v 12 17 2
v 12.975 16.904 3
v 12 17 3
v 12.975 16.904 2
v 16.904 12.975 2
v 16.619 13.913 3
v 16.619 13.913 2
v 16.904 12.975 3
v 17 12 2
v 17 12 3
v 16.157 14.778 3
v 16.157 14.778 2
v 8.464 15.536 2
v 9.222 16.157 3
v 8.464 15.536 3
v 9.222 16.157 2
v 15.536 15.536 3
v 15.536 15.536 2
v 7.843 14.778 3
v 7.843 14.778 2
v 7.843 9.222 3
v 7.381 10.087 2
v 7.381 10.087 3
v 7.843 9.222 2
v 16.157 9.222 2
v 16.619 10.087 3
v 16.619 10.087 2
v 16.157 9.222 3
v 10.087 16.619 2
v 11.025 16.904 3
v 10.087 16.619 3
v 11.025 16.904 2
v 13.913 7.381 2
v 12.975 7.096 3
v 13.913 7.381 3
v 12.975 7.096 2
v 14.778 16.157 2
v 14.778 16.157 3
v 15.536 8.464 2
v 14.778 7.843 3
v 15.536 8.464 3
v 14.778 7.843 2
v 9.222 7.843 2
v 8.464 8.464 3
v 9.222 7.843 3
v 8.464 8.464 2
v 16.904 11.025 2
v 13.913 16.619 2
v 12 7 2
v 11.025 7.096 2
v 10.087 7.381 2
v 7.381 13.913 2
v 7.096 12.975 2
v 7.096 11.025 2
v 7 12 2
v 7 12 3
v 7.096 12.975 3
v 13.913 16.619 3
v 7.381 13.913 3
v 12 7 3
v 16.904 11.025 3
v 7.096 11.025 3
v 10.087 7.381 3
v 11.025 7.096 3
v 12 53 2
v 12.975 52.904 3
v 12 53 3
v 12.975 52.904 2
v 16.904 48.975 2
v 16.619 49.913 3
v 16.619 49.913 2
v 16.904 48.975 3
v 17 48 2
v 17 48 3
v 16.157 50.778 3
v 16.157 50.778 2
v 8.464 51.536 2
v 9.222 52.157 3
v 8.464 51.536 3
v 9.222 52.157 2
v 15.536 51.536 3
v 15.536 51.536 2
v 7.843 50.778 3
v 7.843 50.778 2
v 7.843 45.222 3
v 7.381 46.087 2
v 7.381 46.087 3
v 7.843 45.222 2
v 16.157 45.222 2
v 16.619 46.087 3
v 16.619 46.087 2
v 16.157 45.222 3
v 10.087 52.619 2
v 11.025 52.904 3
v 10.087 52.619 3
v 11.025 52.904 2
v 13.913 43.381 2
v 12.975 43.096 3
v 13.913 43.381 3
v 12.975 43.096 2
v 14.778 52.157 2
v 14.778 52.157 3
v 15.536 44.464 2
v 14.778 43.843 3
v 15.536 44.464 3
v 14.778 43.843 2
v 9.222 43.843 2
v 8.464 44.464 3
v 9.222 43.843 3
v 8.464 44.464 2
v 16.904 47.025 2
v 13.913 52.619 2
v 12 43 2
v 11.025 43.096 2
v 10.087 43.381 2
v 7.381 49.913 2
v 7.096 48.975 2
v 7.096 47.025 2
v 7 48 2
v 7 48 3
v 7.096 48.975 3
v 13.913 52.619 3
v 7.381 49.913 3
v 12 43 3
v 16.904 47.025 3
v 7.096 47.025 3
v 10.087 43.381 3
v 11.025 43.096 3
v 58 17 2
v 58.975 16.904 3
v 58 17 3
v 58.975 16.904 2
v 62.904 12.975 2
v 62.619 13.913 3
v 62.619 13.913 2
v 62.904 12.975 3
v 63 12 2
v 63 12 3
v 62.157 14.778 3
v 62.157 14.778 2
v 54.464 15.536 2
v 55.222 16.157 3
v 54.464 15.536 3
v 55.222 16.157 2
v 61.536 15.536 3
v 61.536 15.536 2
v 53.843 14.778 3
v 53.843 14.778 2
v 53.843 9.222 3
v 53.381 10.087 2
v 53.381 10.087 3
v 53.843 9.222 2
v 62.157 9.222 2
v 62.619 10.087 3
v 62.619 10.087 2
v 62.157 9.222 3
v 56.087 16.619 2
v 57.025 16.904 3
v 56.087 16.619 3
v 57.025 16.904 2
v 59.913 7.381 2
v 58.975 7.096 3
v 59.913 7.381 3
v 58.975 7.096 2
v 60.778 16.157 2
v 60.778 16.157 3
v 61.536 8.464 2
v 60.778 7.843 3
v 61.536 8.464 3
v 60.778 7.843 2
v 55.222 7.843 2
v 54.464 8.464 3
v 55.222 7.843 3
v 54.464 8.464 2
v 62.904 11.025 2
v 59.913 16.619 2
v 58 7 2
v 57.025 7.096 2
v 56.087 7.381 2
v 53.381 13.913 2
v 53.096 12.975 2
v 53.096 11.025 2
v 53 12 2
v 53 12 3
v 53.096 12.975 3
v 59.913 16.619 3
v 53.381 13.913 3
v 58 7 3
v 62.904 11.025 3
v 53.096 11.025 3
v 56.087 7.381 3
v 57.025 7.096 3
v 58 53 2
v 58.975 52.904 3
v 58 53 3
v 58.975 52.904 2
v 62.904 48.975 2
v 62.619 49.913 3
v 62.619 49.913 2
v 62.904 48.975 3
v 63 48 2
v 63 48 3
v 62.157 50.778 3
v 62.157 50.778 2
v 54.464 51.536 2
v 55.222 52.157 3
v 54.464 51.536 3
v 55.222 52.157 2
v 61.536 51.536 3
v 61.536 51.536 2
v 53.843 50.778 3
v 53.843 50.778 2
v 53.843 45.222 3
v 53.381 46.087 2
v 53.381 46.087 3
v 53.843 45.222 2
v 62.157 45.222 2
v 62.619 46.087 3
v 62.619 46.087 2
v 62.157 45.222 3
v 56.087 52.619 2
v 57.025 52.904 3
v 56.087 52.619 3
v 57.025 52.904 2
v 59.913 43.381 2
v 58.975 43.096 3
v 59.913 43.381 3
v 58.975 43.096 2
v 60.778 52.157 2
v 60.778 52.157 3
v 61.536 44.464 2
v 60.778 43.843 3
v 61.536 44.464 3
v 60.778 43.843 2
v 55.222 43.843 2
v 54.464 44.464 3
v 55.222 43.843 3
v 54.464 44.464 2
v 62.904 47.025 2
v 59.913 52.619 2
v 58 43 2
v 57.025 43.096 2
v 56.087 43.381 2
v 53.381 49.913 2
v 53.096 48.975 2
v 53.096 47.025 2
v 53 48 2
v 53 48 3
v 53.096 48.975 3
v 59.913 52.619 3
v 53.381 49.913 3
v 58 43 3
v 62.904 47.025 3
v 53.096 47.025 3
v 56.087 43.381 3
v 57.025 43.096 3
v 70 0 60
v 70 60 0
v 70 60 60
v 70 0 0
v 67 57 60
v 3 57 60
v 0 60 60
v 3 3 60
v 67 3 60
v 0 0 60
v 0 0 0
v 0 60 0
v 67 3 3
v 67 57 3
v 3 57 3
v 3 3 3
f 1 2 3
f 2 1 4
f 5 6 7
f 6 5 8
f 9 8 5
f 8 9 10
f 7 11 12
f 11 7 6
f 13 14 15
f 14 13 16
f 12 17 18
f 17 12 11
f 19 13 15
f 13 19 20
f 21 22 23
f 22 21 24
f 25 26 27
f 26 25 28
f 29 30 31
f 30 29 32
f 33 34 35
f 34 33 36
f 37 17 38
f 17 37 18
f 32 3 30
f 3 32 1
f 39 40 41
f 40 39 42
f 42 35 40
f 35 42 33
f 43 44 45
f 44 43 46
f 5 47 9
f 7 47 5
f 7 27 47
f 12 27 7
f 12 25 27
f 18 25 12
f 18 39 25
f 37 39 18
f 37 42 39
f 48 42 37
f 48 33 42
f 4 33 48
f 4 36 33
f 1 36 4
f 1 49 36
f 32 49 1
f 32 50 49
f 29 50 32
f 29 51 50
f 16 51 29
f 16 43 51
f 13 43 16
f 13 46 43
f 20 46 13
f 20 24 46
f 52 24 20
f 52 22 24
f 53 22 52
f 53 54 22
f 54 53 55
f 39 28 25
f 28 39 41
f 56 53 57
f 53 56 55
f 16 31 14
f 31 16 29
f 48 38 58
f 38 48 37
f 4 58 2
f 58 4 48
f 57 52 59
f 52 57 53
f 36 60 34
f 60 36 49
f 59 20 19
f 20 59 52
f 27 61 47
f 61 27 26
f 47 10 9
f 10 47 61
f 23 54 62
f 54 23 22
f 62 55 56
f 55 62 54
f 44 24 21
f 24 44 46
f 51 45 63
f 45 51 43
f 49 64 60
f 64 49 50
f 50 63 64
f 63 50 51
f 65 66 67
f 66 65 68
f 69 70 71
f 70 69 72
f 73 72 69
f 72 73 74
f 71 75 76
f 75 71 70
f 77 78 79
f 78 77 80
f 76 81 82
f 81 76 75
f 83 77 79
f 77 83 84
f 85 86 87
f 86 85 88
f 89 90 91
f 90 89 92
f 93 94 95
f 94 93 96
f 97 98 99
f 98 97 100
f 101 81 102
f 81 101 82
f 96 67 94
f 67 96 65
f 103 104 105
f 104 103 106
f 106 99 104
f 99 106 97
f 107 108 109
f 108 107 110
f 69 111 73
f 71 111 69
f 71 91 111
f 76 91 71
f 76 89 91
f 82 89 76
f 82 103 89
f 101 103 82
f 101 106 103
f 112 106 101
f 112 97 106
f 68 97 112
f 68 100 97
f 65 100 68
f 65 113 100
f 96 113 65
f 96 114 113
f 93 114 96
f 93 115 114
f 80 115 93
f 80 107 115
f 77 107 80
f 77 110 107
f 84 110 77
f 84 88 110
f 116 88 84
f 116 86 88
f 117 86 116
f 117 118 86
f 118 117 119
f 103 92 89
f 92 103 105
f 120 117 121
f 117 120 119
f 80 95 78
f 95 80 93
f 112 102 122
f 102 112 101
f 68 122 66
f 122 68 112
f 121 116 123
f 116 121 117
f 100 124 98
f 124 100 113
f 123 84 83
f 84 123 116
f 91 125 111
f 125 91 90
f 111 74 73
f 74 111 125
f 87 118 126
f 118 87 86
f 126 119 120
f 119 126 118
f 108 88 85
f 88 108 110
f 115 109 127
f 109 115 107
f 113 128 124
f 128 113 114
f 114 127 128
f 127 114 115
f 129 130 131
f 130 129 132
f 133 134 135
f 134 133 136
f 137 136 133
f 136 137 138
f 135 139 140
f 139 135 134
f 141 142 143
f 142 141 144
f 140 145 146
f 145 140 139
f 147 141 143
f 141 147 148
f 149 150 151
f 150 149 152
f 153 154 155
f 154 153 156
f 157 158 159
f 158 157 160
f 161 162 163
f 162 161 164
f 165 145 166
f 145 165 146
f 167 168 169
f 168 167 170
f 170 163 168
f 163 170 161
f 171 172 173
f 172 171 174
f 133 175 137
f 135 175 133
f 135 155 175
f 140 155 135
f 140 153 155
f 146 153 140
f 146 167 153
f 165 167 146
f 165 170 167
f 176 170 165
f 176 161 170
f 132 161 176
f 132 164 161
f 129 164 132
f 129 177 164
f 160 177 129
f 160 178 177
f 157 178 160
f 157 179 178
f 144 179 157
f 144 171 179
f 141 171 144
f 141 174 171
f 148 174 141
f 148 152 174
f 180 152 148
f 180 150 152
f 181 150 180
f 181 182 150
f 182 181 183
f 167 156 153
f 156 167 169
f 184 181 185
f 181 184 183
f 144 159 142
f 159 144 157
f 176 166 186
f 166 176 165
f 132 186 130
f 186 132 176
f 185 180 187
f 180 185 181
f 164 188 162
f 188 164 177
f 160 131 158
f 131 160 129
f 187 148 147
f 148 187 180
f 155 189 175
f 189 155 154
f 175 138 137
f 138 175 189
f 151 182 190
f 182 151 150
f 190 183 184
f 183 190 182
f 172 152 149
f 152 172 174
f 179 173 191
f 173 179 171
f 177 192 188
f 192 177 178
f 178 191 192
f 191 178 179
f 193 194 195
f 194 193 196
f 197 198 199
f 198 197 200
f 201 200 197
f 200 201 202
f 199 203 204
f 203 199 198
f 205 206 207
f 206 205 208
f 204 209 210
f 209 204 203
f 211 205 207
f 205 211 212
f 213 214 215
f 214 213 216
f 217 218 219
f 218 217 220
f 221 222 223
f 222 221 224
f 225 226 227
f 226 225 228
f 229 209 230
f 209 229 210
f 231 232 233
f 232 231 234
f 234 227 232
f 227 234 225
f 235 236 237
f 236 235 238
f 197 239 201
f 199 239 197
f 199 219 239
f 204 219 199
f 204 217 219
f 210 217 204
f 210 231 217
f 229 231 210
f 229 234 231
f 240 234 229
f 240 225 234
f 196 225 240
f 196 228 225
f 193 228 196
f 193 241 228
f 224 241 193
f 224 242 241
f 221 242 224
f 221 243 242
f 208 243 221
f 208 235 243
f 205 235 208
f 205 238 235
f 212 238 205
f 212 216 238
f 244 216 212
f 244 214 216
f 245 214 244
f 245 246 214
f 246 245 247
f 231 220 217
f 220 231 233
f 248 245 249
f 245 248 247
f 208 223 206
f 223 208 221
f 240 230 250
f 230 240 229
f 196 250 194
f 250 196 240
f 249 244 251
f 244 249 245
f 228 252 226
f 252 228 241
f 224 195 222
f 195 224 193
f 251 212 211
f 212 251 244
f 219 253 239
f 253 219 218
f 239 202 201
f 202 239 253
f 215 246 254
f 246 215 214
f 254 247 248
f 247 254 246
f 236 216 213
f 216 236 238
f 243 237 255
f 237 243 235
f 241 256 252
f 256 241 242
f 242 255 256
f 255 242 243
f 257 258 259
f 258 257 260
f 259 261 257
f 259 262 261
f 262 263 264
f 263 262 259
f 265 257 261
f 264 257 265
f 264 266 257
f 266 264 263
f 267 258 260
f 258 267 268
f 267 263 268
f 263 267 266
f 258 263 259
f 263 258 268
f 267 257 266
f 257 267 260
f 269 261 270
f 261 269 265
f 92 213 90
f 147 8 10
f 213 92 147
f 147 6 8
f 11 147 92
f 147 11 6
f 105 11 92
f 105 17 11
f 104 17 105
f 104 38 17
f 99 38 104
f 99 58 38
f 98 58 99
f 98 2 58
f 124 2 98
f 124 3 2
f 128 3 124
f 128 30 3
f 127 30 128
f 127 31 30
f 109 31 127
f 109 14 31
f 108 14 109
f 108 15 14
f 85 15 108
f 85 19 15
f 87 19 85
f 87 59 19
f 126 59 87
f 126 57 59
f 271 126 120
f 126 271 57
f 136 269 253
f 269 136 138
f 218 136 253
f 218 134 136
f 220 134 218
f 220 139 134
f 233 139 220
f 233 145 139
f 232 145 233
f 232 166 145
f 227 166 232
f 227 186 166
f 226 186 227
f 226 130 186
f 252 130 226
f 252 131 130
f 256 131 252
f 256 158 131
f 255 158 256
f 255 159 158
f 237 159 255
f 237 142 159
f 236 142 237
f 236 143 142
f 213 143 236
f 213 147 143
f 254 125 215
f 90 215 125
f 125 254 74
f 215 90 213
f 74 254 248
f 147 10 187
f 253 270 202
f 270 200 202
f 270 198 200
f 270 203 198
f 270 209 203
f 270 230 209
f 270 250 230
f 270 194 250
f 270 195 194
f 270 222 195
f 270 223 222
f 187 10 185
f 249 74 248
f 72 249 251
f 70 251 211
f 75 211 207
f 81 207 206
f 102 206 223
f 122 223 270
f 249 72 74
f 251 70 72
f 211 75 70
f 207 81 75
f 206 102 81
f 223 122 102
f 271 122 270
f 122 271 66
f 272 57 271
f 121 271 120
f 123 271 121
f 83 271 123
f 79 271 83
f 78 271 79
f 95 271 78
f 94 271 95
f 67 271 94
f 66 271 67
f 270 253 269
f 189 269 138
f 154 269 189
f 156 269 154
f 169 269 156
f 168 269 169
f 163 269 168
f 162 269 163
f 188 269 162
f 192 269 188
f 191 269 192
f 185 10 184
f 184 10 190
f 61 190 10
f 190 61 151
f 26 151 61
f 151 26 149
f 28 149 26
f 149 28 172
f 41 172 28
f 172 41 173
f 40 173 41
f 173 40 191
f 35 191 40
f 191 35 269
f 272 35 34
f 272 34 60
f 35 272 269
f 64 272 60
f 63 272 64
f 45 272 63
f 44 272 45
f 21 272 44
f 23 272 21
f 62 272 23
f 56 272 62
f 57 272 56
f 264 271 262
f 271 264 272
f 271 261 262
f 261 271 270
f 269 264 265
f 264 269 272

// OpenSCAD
$fn = 32;

// ----------------------------------------------------------------------
// Enclosure box: bosses enclosure
// ----------------------------------------------------------------------

// --- parameters (mm) ---
box_l = 70;               // outer length, X
box_w = 60;               // outer width, Y
box_h = 60;               // outer height
wall_t = 3;               // wall thickness
boss_r = 5;               // corner boss radius
hole_r = 1.5;             // boss screw hole radius
boss_in = 12;             // boss inset from the corners

inner_h = box_h - wall_t;  // cavity depth
boss_h = inner_h - 2;  // corner boss height

difference() {
  cube([box_l, box_w, box_h]);
  translate([wall_t, wall_t, wall_t])
    cube([box_l - 2 * wall_t, box_w - 2 * wall_t, box_h]);
  for (sx = [0, 1], sy = [0, 1])
    translate([sx ? box_l - boss_in : boss_in,
               sy ? box_w - boss_in : boss_in, wall_t - 1]) {
      cylinder(r = boss_r, h = boss_h);
      translate([0, 0, boss_h - 4])
        cylinder(r = hole_r, h = 5);
    }
}
